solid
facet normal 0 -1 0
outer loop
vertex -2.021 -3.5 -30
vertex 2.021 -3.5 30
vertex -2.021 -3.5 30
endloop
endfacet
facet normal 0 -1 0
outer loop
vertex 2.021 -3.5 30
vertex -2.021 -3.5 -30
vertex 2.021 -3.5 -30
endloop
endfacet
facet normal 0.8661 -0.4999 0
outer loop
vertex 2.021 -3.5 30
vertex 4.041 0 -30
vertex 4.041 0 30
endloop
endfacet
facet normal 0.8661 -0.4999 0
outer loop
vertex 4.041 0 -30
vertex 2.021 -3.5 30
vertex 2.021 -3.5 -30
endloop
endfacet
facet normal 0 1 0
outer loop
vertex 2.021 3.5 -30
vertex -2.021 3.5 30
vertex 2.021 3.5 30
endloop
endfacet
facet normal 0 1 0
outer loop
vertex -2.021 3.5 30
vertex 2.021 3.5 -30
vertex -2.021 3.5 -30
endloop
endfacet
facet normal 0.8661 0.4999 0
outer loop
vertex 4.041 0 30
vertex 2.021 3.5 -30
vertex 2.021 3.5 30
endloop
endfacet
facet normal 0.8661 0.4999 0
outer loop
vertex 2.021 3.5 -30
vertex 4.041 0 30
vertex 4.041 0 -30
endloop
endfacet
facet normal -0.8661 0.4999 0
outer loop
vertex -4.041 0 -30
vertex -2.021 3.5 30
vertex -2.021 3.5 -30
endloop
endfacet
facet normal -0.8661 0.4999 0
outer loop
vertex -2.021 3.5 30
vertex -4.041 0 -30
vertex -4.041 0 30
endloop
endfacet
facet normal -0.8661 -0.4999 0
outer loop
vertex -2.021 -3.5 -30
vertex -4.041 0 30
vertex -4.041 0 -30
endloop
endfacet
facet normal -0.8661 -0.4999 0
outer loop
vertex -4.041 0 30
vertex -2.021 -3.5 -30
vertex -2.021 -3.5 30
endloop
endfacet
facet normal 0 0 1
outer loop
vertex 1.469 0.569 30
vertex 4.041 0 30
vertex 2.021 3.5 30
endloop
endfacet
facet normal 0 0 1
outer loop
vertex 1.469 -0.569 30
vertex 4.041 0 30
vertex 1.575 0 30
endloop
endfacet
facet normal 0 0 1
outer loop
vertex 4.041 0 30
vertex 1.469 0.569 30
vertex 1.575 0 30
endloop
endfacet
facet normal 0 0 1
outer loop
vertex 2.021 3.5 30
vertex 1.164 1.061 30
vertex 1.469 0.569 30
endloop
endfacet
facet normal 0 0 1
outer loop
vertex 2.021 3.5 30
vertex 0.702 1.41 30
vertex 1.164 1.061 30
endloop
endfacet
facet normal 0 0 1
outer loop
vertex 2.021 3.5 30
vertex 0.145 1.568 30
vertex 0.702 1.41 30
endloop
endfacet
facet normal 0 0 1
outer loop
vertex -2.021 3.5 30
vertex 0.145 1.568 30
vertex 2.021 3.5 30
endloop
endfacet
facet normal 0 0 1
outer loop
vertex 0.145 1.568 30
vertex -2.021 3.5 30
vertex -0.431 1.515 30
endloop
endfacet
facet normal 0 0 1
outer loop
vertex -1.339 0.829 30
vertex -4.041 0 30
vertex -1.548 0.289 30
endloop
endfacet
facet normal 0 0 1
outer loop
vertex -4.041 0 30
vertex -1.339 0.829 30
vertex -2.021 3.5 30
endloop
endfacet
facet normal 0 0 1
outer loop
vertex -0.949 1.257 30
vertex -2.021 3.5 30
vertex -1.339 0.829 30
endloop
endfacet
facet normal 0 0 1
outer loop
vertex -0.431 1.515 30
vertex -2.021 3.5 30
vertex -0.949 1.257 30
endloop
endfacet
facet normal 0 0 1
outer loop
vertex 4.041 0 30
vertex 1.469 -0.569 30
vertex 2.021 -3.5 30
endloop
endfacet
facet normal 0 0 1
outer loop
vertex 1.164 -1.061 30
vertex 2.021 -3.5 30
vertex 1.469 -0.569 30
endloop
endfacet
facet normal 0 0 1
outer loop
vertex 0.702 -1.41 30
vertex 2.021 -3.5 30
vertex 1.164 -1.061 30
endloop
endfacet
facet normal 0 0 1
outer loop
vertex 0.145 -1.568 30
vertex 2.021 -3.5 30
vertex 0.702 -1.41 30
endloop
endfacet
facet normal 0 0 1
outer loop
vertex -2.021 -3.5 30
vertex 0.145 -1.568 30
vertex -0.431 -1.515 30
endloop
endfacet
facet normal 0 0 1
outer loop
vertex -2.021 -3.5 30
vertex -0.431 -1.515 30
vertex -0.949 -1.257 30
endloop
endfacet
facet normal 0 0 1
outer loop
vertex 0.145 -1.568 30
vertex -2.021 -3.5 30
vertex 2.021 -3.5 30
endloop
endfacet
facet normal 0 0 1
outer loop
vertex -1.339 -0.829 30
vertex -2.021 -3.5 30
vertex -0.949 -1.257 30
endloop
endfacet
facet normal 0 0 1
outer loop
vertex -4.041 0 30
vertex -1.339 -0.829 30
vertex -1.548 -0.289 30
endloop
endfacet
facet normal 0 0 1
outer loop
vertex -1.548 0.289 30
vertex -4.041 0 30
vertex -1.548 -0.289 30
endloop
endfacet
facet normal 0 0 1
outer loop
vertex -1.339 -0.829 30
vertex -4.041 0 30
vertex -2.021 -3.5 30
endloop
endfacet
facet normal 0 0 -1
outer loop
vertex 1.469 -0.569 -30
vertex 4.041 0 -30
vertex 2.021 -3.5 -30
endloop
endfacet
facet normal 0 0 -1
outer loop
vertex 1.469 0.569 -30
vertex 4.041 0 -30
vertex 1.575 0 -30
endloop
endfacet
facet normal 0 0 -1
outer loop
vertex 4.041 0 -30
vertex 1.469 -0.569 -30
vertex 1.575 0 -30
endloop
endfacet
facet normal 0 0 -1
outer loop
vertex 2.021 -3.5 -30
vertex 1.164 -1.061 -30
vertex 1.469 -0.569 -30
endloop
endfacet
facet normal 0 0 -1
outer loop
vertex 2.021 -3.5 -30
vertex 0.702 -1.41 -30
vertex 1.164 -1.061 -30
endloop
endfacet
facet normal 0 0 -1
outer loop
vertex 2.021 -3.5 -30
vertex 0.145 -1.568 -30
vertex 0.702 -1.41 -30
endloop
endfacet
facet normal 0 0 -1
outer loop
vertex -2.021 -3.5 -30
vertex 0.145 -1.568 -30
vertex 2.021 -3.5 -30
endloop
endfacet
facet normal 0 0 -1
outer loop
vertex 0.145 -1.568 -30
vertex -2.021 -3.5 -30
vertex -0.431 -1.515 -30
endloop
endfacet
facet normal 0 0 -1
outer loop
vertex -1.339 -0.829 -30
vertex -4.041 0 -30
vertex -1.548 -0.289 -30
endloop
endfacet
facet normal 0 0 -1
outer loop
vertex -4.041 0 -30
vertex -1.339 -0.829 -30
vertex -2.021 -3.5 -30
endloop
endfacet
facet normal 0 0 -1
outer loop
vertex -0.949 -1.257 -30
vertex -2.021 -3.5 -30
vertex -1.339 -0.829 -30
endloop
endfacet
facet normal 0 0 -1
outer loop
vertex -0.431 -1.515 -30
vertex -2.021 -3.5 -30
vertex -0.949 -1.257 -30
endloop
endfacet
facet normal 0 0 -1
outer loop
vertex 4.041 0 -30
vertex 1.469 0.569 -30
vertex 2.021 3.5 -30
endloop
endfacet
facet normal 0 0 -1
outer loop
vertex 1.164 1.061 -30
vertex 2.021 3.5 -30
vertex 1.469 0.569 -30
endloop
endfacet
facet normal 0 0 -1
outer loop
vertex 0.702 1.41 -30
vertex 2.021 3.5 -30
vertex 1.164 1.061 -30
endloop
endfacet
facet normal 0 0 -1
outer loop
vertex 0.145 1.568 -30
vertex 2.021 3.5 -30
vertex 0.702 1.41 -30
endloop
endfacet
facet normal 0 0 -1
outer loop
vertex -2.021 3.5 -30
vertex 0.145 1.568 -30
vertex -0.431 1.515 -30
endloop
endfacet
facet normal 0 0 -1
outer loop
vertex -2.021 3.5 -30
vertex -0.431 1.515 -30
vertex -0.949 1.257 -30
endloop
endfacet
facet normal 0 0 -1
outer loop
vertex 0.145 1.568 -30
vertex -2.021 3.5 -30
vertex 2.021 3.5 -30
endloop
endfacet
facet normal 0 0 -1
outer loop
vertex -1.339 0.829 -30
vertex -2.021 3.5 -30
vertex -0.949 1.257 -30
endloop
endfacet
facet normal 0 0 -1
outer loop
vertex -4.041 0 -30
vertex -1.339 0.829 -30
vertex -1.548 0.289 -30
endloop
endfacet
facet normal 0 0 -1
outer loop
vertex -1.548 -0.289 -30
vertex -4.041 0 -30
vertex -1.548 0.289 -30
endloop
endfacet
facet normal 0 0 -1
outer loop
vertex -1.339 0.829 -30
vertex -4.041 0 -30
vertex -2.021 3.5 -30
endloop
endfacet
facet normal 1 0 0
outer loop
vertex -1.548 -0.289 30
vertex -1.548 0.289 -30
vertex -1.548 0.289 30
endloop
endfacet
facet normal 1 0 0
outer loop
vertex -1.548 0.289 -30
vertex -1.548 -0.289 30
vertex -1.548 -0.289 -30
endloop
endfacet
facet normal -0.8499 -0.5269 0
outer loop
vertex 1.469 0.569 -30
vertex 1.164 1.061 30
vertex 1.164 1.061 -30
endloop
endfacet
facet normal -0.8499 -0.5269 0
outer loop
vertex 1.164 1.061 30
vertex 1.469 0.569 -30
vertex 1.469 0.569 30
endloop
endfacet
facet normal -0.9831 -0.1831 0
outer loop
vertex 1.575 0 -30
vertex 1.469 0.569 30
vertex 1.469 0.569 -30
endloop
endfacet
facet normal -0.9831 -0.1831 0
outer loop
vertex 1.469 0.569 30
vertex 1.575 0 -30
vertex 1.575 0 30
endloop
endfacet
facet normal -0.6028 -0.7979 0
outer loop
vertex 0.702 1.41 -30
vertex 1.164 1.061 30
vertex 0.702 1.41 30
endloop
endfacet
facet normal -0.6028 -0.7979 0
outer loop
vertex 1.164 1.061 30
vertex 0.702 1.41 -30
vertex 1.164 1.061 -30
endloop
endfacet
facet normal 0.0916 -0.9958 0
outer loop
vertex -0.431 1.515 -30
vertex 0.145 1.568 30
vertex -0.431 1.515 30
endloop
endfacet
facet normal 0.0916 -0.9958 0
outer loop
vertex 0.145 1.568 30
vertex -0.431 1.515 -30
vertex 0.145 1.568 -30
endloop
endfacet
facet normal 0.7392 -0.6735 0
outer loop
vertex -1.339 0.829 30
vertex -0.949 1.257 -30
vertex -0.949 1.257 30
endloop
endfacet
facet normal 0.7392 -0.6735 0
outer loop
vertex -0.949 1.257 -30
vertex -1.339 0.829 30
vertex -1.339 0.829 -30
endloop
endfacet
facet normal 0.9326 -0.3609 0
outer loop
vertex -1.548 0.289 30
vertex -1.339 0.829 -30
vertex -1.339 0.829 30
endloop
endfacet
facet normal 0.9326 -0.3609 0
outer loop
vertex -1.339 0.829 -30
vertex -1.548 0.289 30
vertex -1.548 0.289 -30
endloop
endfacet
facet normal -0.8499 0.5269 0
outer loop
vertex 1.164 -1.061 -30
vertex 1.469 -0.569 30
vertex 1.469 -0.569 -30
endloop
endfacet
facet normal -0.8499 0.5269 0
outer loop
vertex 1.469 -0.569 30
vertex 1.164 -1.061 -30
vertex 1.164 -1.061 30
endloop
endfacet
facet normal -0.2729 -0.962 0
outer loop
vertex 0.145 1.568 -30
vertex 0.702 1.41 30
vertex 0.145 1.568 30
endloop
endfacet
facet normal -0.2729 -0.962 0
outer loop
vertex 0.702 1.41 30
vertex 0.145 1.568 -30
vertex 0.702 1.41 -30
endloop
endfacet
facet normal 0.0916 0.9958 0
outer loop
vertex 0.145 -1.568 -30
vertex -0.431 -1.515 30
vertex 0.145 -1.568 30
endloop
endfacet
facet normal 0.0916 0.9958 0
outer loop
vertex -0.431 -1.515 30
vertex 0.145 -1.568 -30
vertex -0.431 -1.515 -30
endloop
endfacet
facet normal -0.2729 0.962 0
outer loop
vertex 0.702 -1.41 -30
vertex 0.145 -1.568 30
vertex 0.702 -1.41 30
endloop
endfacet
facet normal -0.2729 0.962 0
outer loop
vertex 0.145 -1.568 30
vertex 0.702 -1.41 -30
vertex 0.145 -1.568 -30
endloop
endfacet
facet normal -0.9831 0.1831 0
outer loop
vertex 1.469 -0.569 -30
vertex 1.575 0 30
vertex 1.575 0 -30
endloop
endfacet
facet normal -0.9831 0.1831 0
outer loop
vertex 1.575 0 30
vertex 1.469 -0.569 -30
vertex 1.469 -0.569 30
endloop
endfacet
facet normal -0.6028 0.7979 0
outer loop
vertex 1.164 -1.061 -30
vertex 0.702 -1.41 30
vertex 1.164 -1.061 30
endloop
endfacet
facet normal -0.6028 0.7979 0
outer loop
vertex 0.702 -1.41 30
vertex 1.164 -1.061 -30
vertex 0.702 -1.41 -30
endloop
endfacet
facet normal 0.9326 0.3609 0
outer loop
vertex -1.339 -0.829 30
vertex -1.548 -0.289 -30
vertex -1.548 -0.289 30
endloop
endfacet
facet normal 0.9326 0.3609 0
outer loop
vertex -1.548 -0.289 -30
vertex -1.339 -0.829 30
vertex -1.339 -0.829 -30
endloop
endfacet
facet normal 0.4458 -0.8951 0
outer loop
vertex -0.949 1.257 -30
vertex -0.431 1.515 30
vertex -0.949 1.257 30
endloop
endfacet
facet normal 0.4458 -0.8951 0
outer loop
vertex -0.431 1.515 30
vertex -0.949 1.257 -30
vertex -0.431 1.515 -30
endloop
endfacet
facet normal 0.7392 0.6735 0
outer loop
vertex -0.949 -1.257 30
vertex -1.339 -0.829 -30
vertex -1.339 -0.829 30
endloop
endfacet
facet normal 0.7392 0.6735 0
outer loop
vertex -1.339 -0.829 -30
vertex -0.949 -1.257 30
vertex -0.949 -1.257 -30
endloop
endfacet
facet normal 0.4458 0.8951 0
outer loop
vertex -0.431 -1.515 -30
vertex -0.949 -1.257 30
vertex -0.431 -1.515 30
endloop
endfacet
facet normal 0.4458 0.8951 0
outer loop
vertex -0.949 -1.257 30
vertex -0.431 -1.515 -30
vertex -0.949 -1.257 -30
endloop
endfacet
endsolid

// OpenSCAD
use <common.scad>

// 용어
// 1. 육각 스탠드오프(hex standoff)
// 2. 대변 거리(across flat)
// 3. 스탠드오프 길이(standoff length)

// M4 L60 규격 기준 길이입니다.
function hex_standoff_m4_l60_len() = 60;

module hex_standoff_m4_l60(part_color = [0.74, 0.41, 0]) {
    hex_standoff(across_flat = 7,
                 standoff_len = hex_standoff_m4_l60_len(),
                 part_color = part_color);
}

hex_standoff_m4_l60();
